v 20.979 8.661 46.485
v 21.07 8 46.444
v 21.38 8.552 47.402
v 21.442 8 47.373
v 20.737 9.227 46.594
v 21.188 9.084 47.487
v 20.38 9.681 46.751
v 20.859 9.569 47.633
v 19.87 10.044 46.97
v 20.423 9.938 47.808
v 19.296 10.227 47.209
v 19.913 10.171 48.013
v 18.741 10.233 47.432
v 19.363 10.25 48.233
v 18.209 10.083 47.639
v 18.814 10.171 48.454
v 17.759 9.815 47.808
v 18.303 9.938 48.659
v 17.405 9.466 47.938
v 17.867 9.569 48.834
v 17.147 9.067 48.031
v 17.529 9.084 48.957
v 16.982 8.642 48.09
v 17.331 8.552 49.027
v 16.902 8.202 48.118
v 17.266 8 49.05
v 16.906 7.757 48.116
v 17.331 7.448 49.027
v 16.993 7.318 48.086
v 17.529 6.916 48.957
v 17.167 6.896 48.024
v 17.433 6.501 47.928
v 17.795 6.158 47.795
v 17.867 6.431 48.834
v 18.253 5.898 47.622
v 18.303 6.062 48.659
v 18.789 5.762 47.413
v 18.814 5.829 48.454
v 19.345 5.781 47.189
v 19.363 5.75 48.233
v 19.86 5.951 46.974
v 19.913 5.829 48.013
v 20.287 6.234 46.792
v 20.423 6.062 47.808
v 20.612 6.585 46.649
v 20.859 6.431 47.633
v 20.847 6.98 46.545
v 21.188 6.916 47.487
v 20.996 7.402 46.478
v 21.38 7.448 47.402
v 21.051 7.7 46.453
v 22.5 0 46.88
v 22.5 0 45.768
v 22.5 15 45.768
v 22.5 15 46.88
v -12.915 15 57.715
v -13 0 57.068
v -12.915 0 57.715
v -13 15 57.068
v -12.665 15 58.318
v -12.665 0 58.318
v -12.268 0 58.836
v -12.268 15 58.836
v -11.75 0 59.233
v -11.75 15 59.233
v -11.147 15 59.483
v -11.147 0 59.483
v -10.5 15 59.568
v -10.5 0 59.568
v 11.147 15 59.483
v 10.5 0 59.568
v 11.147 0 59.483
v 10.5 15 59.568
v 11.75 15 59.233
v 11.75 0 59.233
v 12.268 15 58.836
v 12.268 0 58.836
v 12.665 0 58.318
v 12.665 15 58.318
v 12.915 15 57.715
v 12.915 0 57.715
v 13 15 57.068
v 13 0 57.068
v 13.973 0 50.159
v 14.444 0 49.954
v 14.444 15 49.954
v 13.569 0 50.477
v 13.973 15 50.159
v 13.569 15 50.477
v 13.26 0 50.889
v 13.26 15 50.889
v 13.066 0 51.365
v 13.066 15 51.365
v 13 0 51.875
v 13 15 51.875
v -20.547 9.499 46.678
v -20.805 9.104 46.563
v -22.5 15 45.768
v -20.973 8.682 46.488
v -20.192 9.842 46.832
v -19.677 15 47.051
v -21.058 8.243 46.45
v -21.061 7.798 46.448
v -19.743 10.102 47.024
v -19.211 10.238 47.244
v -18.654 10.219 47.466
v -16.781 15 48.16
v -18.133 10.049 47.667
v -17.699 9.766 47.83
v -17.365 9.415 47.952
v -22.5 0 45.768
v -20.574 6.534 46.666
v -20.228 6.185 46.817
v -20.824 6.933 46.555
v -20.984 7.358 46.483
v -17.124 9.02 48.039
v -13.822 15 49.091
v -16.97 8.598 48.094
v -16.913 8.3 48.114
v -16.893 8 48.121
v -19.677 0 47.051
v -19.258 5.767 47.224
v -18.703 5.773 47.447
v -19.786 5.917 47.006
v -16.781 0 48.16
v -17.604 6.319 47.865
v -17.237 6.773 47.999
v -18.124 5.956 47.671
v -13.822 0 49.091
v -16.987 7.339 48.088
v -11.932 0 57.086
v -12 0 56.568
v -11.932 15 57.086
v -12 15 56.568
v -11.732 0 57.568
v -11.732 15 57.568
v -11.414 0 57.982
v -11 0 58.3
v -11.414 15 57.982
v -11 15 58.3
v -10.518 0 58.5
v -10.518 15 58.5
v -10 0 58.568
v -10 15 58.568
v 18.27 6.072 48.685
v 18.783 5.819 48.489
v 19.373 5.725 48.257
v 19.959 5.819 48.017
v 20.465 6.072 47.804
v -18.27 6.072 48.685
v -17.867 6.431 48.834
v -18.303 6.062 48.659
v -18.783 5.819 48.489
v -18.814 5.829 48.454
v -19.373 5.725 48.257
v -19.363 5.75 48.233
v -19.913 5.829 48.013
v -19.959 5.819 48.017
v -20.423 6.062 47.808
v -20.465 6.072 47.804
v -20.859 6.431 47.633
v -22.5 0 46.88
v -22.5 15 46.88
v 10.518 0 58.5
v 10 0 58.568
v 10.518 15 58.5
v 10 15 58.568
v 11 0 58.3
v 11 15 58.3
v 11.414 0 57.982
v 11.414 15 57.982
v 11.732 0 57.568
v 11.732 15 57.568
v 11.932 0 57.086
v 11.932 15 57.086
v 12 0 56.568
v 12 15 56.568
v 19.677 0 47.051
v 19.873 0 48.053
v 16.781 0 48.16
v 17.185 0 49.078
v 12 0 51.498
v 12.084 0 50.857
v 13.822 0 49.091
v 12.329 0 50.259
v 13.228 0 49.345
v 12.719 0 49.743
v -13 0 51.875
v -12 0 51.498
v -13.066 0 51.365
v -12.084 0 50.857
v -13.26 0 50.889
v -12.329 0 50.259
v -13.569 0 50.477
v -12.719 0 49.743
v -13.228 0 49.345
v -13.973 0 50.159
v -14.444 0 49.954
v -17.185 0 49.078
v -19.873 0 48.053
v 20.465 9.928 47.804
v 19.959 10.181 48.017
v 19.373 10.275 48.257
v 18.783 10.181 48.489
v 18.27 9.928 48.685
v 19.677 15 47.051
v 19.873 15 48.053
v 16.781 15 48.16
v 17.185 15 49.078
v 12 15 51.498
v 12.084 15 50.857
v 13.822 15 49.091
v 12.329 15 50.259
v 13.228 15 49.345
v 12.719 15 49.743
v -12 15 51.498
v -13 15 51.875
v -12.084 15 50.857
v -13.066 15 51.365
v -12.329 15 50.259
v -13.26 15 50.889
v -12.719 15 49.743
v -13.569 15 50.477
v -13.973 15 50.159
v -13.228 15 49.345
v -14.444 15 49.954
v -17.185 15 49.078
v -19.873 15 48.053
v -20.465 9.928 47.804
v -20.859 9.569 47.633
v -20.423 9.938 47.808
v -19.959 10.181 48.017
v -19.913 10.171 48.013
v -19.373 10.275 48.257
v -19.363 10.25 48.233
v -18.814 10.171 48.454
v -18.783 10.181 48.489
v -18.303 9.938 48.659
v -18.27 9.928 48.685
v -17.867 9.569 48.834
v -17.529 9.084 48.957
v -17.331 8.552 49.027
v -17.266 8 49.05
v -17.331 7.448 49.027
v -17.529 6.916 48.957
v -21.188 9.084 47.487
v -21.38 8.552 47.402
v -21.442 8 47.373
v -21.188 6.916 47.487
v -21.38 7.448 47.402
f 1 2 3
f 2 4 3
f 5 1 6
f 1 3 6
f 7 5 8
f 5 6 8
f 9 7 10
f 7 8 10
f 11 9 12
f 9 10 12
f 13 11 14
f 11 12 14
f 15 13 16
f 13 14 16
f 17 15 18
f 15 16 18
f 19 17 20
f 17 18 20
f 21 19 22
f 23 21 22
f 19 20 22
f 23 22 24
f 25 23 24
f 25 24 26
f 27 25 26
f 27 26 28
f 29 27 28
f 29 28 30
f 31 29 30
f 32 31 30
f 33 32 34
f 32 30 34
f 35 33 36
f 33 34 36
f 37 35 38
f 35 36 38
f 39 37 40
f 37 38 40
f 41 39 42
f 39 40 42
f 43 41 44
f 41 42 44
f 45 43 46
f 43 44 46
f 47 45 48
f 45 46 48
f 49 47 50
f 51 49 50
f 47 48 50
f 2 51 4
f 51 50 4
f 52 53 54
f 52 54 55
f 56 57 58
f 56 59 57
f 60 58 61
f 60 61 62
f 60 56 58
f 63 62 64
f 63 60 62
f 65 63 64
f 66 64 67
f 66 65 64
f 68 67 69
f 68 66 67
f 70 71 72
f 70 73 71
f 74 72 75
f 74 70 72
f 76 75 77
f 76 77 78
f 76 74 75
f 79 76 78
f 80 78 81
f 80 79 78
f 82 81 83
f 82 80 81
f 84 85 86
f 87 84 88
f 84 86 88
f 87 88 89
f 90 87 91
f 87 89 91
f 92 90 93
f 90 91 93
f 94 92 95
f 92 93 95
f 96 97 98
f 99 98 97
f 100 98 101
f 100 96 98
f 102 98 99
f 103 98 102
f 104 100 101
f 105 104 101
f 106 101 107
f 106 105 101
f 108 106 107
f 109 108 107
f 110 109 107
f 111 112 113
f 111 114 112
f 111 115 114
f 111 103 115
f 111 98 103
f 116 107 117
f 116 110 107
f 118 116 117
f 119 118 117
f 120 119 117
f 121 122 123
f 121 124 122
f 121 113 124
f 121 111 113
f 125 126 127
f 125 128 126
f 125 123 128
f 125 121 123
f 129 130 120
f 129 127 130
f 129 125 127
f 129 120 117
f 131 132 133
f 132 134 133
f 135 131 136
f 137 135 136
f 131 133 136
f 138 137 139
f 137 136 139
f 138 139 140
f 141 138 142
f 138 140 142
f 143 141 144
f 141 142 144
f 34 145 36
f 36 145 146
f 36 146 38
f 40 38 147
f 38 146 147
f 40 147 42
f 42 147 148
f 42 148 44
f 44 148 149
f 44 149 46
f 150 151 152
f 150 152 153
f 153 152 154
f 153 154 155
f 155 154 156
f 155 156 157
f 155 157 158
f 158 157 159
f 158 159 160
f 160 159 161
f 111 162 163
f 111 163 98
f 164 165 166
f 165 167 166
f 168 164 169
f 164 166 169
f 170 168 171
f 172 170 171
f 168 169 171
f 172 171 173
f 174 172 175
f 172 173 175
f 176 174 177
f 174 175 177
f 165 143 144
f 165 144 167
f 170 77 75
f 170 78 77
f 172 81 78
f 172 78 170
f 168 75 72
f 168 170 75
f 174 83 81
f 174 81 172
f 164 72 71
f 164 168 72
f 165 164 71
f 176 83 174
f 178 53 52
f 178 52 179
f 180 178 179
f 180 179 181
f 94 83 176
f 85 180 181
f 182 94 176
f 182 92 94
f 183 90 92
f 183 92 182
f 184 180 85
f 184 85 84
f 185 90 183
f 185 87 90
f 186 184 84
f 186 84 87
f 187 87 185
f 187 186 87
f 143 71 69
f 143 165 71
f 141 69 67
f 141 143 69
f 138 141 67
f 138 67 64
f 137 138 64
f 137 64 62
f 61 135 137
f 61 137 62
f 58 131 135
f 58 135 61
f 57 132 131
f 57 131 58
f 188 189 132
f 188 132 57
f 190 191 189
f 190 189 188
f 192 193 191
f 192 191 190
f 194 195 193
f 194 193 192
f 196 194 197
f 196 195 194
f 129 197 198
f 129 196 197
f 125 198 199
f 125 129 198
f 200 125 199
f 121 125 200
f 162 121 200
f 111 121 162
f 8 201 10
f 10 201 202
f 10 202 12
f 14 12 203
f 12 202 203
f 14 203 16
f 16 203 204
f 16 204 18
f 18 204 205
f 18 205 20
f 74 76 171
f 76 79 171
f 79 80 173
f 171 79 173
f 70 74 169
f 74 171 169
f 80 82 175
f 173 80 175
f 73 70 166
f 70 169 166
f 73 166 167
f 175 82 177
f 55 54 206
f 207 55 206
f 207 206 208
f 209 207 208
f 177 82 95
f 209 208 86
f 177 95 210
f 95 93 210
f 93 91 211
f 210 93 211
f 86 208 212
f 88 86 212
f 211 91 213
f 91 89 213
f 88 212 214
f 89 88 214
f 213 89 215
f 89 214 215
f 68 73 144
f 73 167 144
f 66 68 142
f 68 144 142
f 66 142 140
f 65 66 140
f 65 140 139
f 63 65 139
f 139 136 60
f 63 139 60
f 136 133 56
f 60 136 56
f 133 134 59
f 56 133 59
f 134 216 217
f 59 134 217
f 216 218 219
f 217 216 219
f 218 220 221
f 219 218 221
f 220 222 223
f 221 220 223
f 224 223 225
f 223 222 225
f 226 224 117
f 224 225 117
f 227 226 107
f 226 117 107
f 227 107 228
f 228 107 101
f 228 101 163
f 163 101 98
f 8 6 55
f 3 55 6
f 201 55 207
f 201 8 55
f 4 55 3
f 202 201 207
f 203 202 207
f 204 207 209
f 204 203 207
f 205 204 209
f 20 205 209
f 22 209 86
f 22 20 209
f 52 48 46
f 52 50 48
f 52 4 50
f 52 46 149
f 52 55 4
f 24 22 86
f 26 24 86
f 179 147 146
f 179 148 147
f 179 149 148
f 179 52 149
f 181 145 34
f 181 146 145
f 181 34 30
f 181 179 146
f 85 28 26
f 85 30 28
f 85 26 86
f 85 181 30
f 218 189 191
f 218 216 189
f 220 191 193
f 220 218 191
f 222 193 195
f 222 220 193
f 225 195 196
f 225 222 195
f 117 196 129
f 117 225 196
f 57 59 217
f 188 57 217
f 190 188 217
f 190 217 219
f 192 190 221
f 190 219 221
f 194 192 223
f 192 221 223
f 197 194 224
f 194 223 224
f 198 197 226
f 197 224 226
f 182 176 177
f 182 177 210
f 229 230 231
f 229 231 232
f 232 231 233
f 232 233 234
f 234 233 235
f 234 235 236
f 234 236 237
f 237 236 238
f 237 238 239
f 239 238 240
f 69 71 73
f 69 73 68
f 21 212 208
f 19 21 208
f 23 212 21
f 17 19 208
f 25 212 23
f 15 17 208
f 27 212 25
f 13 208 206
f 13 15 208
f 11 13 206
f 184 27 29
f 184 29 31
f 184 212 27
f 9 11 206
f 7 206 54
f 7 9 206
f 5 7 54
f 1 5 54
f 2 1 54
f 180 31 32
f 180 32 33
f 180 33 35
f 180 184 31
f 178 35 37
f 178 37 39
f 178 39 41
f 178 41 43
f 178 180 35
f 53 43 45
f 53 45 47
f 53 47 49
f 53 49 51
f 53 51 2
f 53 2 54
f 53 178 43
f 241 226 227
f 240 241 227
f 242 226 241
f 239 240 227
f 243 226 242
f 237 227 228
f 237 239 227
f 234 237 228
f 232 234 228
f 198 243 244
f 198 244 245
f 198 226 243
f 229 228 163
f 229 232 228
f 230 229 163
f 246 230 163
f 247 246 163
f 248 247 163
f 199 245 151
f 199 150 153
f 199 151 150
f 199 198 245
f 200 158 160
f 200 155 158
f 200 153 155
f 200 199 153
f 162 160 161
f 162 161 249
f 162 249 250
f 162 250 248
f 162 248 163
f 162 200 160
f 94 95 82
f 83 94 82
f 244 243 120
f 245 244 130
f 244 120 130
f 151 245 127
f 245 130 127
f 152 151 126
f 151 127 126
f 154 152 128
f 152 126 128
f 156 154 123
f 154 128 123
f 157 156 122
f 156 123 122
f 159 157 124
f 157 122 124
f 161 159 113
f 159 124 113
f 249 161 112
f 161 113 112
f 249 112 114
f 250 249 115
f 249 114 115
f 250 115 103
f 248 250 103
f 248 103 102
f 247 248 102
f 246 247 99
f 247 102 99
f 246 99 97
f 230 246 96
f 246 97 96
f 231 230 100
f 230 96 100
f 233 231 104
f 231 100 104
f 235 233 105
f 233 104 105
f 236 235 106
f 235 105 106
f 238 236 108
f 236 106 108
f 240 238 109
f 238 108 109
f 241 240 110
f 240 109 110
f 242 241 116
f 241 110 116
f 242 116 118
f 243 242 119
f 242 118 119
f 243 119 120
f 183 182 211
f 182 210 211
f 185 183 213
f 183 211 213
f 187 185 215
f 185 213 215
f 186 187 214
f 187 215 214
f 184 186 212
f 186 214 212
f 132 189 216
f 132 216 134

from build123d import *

# Parameters (mm, degrees)
EXTRUDE_1_DEPTH = 15
FILLET_1_R      = 2
FILLET_2_R      = 2.5


# Read off the part's stored shape, not the designer's step: Отверстие с зазором M41
with BuildPart() as part:
    # Эскиз1 → Бобышка-Вытянуть1 (new body)
    with BuildSketch(Plane(origin=(0, 0, 0), x_dir=(1, 0, 0), z_dir=(0, 1, 0))):
        with BuildLine():
            Line((-22.5, -46.880166382), (-22.5, -45.768438907))
            ThreePointArc((-22.5, -45.768438907), (-17.354305588, -47.956522784), (-12, -49.568134926))
            Line((-12, -49.568134926), (-12, -58.568134926))
            Line((-12, -58.568134926), (12, -58.568134926))
            Line((12, -58.568134926), (12, -49.568134926))
            ThreePointArc((12, -49.568134926), (17.354305588, -47.956522784), (22.5, -45.768438907))
            Line((22.5, -45.768438907), (22.5, -46.880166382))
            ThreePointArc((22.5, -46.880166382), (17.834526239, -48.845979096), (13, -50.348783501))
            Line((13, -50.348783501), (13, -59.568134926))
            Line((13, -59.568134926), (-13, -59.568134926))
            Line((-13, -59.568134926), (-13, -50.348783501))
            ThreePointArc((-13, -50.348783501), (-17.834526239, -48.845979096), (-22.5, -46.880166382))
        make_face()
    extrude(amount=EXTRUDE_1_DEPTH)

    # Скругление1
    fillet_1_edges = [part.edges().sort_by_distance(p)[0] for p in [
        (-13, 7.5, 50.348783501),
        (13, 7.5, 50.348783501),
        (12, 7.5, 58.568134926),
        (-12, 7.5, 58.568134926),
    ]]
    fillet(fillet_1_edges, radius=FILLET_1_R)

    # Скругление2
    fillet_2_edges = [part.edges().sort_by_distance(p)[0] for p in [
        (-12, 7.5, 49.568134926),
        (-13, 7.5, 59.568134926),
        (13, 7.5, 59.568134926),
        (12, 7.5, 49.568134926),
    ]]
    fillet(fillet_2_edges, radius=FILLET_2_R)

    # Отверстие с зазором M41 outline → Отверстие с зазором M41 (revolve, cut)
    with BuildSketch(Plane(origin=(0, 8, 0), x_dir=(0.9280125149960182, 0, -0.37254901960784303), z_dir=(0, -1, 0))):
        Polygon((2.25, 52.000021479), (2.25, 51.975), (2.275021479, 52.000021479), align=None)
        Polygon((2.25, 50.950316764), (2.25, 51.975), (2.25, 52.000021479), (0, 52.000021479), (0, 50.950316764), align=None)
    revolve(axis=Axis((0, 8, 0), (0.37254901960784303, 0, 0.9280125149960182)), mode=Mode.SUBTRACT)

    # Hole Wizard M41 2 outline → Hole Wizard M41 2 (revolve, cut)
    with BuildSketch(Plane(origin=(0, 8, 0), x_dir=(0.9280125149960182, 0, 0.37254901960784303), z_dir=(0, 1, 0))):
        Polygon((2.25, -52.000019282), (2.25, -51.975), (2.25, -50.950316764), (0, -50.950316764), (0, -52.000019282), align=None)
        Polygon((2.275019282, -52.000019282), (2.249998249, -51.974998249), (2.25, -52.000019282), align=None)
    revolve(axis=Axis((0, 8, 0), (0.37254901960784303, 0, -0.9280125149960182)), mode=Mode.SUBTRACT)


solid = part.part
